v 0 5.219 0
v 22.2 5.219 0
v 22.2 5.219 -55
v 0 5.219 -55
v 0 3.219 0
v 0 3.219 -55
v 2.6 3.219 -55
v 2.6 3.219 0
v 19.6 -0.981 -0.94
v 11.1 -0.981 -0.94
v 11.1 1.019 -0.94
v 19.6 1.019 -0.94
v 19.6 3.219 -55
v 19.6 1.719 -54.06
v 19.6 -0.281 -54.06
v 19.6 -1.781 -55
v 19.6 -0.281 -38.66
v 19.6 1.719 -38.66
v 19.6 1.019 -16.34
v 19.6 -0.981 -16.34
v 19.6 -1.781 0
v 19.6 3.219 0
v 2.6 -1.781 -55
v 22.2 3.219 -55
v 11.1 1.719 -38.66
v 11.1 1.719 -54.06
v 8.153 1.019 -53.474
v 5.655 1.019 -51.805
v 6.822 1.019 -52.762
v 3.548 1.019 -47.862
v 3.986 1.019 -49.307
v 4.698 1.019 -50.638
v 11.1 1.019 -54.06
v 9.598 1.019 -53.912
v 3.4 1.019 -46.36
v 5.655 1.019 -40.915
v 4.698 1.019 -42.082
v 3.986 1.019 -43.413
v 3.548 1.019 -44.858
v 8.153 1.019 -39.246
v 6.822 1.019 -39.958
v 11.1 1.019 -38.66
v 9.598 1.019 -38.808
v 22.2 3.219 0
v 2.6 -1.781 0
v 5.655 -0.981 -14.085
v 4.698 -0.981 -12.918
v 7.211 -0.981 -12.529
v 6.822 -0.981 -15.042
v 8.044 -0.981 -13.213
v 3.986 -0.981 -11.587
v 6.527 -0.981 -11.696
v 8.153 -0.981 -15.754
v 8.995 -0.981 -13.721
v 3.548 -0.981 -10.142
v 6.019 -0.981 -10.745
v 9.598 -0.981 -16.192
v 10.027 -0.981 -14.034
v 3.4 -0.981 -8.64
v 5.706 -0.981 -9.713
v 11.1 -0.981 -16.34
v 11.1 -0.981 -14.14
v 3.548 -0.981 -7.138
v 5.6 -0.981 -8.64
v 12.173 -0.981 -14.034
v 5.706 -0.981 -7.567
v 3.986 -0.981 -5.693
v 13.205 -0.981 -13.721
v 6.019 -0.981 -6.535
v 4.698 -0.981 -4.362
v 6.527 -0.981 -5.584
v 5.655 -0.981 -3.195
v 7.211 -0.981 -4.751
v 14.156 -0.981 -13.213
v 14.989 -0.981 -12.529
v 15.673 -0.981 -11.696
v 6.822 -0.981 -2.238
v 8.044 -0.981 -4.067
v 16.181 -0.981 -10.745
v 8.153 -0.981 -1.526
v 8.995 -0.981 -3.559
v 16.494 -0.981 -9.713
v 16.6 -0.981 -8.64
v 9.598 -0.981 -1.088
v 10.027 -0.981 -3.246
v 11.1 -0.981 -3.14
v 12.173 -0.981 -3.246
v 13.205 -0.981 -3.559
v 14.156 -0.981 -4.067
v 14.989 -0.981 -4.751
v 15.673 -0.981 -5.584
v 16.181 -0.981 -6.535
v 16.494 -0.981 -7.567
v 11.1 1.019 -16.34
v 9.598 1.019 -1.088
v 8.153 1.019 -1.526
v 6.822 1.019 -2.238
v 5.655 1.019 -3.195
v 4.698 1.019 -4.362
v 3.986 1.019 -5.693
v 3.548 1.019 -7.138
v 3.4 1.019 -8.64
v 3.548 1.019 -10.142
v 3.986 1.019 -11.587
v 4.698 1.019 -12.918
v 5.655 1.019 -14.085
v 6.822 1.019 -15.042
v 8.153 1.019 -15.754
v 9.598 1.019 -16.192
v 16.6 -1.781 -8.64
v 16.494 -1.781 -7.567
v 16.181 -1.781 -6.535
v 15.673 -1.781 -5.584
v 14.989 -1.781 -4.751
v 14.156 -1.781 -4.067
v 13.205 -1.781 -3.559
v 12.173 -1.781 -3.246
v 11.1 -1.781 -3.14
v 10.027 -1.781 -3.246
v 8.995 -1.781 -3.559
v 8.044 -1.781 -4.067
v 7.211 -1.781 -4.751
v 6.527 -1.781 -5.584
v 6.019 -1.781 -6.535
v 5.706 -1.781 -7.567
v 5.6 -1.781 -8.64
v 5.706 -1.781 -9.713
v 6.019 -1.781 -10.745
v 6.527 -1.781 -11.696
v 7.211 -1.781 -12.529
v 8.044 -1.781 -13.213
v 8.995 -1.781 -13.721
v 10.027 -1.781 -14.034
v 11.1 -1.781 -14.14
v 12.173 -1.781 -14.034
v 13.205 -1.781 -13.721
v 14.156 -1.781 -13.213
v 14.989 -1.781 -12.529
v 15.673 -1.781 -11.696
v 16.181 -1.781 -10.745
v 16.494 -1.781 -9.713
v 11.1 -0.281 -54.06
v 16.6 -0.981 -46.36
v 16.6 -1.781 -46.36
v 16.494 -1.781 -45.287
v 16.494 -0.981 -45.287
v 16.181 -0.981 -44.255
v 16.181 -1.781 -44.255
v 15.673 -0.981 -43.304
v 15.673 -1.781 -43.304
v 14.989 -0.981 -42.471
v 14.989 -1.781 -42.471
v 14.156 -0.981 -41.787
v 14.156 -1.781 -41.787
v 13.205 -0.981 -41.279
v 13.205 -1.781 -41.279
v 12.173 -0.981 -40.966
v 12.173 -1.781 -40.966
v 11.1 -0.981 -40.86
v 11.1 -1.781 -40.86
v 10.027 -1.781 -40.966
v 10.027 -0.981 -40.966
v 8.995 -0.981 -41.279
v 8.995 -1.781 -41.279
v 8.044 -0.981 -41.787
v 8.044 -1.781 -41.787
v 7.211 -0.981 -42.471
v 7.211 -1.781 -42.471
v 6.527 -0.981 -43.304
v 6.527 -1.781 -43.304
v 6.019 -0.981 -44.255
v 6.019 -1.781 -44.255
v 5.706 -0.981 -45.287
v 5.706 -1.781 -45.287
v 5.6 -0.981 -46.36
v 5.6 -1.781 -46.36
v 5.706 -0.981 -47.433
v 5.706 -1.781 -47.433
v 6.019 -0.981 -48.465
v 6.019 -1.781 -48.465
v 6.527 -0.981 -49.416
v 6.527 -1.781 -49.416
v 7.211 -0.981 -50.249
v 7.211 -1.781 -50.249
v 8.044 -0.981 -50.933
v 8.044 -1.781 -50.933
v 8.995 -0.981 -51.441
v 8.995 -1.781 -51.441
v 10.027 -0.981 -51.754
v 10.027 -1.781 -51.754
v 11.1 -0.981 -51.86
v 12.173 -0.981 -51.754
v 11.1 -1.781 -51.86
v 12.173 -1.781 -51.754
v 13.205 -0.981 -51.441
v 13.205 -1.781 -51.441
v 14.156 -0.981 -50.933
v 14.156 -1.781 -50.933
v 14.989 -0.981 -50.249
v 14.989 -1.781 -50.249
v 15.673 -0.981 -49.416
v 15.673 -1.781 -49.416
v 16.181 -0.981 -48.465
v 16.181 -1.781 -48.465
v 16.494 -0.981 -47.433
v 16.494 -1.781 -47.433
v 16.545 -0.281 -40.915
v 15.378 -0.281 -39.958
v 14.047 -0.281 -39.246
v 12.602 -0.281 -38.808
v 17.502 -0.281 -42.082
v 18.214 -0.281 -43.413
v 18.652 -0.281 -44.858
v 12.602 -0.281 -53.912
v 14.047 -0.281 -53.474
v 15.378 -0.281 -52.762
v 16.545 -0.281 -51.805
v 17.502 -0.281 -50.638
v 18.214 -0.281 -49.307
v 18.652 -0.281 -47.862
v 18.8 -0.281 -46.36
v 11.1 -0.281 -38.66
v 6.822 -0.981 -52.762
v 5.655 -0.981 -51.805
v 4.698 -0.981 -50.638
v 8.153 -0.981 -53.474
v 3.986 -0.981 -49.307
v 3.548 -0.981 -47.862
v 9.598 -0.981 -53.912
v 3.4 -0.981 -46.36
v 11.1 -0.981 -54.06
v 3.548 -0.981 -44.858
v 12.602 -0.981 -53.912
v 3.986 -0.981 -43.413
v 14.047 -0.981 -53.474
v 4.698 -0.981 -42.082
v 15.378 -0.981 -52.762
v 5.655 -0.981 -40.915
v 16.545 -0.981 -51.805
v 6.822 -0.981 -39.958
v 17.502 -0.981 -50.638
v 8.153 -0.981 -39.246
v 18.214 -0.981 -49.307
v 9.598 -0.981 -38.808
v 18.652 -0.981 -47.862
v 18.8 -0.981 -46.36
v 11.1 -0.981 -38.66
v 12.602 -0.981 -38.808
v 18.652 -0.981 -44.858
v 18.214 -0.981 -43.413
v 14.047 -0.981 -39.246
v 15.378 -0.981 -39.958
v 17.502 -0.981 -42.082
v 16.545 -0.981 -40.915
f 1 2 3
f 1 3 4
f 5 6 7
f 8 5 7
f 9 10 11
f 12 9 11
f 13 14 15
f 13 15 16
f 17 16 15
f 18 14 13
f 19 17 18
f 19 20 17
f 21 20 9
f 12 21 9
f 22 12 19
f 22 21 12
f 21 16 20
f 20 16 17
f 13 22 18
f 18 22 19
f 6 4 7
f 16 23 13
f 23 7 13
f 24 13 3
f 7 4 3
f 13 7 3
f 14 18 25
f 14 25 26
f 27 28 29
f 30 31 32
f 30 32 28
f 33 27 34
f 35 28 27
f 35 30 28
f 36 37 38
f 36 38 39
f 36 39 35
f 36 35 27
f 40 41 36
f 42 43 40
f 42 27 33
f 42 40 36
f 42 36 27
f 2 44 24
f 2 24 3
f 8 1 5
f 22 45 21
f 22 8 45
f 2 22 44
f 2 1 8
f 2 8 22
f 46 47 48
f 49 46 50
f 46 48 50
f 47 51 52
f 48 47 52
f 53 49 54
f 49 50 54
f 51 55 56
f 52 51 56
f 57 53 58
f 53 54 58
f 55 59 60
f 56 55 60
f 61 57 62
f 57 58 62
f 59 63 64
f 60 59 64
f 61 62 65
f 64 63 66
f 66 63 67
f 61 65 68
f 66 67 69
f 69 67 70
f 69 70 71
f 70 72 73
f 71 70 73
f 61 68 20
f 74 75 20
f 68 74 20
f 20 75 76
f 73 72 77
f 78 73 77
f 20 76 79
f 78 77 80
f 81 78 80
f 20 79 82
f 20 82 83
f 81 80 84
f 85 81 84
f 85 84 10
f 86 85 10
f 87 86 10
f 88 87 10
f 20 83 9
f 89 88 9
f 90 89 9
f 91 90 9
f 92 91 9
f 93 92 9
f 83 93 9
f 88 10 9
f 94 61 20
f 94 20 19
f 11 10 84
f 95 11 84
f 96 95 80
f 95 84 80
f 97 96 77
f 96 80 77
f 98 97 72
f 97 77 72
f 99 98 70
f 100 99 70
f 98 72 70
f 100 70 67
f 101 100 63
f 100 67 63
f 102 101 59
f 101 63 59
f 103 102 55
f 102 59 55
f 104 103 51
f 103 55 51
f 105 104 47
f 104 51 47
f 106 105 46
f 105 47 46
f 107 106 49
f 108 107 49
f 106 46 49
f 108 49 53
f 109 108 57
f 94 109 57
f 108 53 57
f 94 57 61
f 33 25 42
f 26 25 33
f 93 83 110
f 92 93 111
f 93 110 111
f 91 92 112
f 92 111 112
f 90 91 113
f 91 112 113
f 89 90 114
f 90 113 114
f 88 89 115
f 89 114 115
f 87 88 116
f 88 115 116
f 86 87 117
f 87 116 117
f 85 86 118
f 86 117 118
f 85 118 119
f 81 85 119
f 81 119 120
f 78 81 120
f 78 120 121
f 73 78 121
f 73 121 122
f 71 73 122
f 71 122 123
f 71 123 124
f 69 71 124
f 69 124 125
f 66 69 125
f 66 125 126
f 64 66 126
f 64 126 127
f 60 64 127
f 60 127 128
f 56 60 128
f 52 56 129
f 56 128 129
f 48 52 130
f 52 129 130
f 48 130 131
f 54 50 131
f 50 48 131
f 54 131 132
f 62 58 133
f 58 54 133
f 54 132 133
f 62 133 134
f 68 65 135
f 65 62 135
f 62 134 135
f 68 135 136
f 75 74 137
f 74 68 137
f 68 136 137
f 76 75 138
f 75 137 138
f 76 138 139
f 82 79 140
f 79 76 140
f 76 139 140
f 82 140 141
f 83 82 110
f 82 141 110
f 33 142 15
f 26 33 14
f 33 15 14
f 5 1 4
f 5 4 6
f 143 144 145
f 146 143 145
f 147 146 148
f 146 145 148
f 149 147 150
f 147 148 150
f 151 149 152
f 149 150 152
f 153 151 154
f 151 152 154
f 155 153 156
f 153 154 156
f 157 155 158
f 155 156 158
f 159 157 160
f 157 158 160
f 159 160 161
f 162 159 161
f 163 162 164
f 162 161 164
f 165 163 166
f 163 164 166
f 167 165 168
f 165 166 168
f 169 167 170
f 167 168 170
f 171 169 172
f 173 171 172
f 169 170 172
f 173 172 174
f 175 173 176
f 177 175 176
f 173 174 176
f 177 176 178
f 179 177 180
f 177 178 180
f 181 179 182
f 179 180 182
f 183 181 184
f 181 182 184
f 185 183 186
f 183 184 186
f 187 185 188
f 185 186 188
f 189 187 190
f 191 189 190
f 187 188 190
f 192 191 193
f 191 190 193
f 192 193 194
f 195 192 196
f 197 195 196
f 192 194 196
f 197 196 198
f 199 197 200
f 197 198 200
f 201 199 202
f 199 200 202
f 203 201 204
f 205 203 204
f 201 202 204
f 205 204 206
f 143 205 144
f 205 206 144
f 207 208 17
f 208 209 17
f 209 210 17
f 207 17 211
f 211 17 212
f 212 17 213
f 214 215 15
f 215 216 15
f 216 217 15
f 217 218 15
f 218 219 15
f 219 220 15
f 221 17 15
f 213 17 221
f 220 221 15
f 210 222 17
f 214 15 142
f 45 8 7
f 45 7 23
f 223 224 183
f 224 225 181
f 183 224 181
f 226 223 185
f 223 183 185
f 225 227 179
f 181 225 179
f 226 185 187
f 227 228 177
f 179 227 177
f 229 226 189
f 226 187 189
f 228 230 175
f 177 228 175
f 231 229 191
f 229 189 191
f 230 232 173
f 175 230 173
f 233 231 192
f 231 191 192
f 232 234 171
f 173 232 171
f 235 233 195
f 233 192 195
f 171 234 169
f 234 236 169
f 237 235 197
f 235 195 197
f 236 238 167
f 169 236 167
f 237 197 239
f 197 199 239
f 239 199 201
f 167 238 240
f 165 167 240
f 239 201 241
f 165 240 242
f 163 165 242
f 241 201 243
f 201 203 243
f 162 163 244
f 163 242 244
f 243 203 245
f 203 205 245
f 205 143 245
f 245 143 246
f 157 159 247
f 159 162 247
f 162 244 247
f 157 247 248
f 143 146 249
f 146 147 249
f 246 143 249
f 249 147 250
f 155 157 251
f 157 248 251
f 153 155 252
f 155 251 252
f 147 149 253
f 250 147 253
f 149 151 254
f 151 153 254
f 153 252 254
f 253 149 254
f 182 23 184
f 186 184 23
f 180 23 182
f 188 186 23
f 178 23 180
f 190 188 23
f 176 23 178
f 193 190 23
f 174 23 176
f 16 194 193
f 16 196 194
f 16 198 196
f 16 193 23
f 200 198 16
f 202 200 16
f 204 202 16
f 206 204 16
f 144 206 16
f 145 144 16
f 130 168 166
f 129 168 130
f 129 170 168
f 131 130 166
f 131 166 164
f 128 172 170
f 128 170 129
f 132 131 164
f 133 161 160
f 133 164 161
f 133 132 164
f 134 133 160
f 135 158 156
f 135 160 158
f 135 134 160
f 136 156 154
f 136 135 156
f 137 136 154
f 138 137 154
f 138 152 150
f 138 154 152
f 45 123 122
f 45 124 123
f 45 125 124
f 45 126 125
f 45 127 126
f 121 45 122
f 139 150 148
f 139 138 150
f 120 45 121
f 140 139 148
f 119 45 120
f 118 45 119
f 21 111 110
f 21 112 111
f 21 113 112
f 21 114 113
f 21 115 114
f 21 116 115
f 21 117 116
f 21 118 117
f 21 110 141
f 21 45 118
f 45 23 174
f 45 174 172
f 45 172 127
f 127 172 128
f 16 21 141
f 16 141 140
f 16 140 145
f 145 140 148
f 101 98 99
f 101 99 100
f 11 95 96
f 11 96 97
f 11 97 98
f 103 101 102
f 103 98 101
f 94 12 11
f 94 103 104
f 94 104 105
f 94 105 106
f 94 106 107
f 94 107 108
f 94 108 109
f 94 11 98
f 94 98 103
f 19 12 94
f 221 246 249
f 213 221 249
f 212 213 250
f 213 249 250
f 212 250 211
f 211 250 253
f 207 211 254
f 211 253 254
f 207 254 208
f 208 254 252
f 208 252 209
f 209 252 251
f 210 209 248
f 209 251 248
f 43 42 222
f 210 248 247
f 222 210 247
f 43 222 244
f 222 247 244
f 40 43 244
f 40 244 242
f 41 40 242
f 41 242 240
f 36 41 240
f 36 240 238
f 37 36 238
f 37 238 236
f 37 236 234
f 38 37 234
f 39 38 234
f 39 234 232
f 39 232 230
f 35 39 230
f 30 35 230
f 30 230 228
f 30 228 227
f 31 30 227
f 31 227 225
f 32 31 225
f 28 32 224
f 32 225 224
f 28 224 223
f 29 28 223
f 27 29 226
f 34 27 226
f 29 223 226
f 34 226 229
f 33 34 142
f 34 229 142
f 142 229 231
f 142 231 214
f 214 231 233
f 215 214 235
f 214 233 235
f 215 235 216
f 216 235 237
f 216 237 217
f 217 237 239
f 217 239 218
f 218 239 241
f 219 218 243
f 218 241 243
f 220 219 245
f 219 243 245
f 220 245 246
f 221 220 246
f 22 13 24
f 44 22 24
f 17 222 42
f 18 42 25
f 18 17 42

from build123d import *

# Parameters (mm, degrees)
BOSS_EXTRUDE1_DEPTH = 55
SKETCH3_R           = 7.7
CUT_EXTRUDE1_DEPTH  = 2.8
SKETCH4_R           = 7.7
SKETCH4_R_2         = 5.5
BOSS_EXTRUDE2_DEPTH = 0.8
SKETCH5_W           = 15.4
SKETCH5_H           = 2
CUT_EXTRUDE2_DEPTH  = 8.5


with BuildPart() as part:
    # Sketch2 → Boss-Extrude1 (new body)
    with BuildSketch(Plane.XY):
        Polygon((2.6, -1.780794077), (19.6, -1.780794077), (19.6, 3.219205923), (22.2, 3.219205923), (22.2, 5.219205923), (0, 5.219205923), (0, 3.219205923), (2.6, 3.219205923), align=None)
    extrude(amount=-BOSS_EXTRUDE1_DEPTH)

    # Sketch3 → Cut-Extrude1 (cut)
    with BuildSketch(Plane.XZ.offset(1.780794077)):
        with Locations((11.1, -8.64)):
            Circle(SKETCH3_R)
        with Locations((11.1, -46.36)):
            Circle(SKETCH3_R)
    extrude(amount=-CUT_EXTRUDE1_DEPTH, mode=Mode.SUBTRACT)

    # Sketch4 → Boss-Extrude2 (add)
    with BuildSketch(Plane.XZ.offset(1.780794077)):
        with Locations((11.1, -8.64)):
            Circle(SKETCH4_R)
        with Locations((11.1, -8.64)):
            Circle(SKETCH4_R_2, mode=Mode.SUBTRACT)
        with Locations((11.1, -46.36)):
            Circle(SKETCH4_R)
        with Locations((11.1, -46.36)):
            Circle(SKETCH4_R_2, mode=Mode.SUBTRACT)
    extrude(amount=-BOSS_EXTRUDE2_DEPTH)

    # Sketch5 → Cut-Extrude2 (cut)
    with BuildSketch(Plane(origin=(19.6, 0, 0), x_dir=(0, 0, -1), z_dir=(1, 0, 0))):
        with Locations((8.64, 0.019205923)):
            Rectangle(SKETCH5_W, SKETCH5_H)
        with Locations((46.36, 0.719205923)):
            Rectangle(SKETCH5_W, SKETCH5_H)
    extrude(amount=-CUT_EXTRUDE2_DEPTH, mode=Mode.SUBTRACT)


solid = part.part
